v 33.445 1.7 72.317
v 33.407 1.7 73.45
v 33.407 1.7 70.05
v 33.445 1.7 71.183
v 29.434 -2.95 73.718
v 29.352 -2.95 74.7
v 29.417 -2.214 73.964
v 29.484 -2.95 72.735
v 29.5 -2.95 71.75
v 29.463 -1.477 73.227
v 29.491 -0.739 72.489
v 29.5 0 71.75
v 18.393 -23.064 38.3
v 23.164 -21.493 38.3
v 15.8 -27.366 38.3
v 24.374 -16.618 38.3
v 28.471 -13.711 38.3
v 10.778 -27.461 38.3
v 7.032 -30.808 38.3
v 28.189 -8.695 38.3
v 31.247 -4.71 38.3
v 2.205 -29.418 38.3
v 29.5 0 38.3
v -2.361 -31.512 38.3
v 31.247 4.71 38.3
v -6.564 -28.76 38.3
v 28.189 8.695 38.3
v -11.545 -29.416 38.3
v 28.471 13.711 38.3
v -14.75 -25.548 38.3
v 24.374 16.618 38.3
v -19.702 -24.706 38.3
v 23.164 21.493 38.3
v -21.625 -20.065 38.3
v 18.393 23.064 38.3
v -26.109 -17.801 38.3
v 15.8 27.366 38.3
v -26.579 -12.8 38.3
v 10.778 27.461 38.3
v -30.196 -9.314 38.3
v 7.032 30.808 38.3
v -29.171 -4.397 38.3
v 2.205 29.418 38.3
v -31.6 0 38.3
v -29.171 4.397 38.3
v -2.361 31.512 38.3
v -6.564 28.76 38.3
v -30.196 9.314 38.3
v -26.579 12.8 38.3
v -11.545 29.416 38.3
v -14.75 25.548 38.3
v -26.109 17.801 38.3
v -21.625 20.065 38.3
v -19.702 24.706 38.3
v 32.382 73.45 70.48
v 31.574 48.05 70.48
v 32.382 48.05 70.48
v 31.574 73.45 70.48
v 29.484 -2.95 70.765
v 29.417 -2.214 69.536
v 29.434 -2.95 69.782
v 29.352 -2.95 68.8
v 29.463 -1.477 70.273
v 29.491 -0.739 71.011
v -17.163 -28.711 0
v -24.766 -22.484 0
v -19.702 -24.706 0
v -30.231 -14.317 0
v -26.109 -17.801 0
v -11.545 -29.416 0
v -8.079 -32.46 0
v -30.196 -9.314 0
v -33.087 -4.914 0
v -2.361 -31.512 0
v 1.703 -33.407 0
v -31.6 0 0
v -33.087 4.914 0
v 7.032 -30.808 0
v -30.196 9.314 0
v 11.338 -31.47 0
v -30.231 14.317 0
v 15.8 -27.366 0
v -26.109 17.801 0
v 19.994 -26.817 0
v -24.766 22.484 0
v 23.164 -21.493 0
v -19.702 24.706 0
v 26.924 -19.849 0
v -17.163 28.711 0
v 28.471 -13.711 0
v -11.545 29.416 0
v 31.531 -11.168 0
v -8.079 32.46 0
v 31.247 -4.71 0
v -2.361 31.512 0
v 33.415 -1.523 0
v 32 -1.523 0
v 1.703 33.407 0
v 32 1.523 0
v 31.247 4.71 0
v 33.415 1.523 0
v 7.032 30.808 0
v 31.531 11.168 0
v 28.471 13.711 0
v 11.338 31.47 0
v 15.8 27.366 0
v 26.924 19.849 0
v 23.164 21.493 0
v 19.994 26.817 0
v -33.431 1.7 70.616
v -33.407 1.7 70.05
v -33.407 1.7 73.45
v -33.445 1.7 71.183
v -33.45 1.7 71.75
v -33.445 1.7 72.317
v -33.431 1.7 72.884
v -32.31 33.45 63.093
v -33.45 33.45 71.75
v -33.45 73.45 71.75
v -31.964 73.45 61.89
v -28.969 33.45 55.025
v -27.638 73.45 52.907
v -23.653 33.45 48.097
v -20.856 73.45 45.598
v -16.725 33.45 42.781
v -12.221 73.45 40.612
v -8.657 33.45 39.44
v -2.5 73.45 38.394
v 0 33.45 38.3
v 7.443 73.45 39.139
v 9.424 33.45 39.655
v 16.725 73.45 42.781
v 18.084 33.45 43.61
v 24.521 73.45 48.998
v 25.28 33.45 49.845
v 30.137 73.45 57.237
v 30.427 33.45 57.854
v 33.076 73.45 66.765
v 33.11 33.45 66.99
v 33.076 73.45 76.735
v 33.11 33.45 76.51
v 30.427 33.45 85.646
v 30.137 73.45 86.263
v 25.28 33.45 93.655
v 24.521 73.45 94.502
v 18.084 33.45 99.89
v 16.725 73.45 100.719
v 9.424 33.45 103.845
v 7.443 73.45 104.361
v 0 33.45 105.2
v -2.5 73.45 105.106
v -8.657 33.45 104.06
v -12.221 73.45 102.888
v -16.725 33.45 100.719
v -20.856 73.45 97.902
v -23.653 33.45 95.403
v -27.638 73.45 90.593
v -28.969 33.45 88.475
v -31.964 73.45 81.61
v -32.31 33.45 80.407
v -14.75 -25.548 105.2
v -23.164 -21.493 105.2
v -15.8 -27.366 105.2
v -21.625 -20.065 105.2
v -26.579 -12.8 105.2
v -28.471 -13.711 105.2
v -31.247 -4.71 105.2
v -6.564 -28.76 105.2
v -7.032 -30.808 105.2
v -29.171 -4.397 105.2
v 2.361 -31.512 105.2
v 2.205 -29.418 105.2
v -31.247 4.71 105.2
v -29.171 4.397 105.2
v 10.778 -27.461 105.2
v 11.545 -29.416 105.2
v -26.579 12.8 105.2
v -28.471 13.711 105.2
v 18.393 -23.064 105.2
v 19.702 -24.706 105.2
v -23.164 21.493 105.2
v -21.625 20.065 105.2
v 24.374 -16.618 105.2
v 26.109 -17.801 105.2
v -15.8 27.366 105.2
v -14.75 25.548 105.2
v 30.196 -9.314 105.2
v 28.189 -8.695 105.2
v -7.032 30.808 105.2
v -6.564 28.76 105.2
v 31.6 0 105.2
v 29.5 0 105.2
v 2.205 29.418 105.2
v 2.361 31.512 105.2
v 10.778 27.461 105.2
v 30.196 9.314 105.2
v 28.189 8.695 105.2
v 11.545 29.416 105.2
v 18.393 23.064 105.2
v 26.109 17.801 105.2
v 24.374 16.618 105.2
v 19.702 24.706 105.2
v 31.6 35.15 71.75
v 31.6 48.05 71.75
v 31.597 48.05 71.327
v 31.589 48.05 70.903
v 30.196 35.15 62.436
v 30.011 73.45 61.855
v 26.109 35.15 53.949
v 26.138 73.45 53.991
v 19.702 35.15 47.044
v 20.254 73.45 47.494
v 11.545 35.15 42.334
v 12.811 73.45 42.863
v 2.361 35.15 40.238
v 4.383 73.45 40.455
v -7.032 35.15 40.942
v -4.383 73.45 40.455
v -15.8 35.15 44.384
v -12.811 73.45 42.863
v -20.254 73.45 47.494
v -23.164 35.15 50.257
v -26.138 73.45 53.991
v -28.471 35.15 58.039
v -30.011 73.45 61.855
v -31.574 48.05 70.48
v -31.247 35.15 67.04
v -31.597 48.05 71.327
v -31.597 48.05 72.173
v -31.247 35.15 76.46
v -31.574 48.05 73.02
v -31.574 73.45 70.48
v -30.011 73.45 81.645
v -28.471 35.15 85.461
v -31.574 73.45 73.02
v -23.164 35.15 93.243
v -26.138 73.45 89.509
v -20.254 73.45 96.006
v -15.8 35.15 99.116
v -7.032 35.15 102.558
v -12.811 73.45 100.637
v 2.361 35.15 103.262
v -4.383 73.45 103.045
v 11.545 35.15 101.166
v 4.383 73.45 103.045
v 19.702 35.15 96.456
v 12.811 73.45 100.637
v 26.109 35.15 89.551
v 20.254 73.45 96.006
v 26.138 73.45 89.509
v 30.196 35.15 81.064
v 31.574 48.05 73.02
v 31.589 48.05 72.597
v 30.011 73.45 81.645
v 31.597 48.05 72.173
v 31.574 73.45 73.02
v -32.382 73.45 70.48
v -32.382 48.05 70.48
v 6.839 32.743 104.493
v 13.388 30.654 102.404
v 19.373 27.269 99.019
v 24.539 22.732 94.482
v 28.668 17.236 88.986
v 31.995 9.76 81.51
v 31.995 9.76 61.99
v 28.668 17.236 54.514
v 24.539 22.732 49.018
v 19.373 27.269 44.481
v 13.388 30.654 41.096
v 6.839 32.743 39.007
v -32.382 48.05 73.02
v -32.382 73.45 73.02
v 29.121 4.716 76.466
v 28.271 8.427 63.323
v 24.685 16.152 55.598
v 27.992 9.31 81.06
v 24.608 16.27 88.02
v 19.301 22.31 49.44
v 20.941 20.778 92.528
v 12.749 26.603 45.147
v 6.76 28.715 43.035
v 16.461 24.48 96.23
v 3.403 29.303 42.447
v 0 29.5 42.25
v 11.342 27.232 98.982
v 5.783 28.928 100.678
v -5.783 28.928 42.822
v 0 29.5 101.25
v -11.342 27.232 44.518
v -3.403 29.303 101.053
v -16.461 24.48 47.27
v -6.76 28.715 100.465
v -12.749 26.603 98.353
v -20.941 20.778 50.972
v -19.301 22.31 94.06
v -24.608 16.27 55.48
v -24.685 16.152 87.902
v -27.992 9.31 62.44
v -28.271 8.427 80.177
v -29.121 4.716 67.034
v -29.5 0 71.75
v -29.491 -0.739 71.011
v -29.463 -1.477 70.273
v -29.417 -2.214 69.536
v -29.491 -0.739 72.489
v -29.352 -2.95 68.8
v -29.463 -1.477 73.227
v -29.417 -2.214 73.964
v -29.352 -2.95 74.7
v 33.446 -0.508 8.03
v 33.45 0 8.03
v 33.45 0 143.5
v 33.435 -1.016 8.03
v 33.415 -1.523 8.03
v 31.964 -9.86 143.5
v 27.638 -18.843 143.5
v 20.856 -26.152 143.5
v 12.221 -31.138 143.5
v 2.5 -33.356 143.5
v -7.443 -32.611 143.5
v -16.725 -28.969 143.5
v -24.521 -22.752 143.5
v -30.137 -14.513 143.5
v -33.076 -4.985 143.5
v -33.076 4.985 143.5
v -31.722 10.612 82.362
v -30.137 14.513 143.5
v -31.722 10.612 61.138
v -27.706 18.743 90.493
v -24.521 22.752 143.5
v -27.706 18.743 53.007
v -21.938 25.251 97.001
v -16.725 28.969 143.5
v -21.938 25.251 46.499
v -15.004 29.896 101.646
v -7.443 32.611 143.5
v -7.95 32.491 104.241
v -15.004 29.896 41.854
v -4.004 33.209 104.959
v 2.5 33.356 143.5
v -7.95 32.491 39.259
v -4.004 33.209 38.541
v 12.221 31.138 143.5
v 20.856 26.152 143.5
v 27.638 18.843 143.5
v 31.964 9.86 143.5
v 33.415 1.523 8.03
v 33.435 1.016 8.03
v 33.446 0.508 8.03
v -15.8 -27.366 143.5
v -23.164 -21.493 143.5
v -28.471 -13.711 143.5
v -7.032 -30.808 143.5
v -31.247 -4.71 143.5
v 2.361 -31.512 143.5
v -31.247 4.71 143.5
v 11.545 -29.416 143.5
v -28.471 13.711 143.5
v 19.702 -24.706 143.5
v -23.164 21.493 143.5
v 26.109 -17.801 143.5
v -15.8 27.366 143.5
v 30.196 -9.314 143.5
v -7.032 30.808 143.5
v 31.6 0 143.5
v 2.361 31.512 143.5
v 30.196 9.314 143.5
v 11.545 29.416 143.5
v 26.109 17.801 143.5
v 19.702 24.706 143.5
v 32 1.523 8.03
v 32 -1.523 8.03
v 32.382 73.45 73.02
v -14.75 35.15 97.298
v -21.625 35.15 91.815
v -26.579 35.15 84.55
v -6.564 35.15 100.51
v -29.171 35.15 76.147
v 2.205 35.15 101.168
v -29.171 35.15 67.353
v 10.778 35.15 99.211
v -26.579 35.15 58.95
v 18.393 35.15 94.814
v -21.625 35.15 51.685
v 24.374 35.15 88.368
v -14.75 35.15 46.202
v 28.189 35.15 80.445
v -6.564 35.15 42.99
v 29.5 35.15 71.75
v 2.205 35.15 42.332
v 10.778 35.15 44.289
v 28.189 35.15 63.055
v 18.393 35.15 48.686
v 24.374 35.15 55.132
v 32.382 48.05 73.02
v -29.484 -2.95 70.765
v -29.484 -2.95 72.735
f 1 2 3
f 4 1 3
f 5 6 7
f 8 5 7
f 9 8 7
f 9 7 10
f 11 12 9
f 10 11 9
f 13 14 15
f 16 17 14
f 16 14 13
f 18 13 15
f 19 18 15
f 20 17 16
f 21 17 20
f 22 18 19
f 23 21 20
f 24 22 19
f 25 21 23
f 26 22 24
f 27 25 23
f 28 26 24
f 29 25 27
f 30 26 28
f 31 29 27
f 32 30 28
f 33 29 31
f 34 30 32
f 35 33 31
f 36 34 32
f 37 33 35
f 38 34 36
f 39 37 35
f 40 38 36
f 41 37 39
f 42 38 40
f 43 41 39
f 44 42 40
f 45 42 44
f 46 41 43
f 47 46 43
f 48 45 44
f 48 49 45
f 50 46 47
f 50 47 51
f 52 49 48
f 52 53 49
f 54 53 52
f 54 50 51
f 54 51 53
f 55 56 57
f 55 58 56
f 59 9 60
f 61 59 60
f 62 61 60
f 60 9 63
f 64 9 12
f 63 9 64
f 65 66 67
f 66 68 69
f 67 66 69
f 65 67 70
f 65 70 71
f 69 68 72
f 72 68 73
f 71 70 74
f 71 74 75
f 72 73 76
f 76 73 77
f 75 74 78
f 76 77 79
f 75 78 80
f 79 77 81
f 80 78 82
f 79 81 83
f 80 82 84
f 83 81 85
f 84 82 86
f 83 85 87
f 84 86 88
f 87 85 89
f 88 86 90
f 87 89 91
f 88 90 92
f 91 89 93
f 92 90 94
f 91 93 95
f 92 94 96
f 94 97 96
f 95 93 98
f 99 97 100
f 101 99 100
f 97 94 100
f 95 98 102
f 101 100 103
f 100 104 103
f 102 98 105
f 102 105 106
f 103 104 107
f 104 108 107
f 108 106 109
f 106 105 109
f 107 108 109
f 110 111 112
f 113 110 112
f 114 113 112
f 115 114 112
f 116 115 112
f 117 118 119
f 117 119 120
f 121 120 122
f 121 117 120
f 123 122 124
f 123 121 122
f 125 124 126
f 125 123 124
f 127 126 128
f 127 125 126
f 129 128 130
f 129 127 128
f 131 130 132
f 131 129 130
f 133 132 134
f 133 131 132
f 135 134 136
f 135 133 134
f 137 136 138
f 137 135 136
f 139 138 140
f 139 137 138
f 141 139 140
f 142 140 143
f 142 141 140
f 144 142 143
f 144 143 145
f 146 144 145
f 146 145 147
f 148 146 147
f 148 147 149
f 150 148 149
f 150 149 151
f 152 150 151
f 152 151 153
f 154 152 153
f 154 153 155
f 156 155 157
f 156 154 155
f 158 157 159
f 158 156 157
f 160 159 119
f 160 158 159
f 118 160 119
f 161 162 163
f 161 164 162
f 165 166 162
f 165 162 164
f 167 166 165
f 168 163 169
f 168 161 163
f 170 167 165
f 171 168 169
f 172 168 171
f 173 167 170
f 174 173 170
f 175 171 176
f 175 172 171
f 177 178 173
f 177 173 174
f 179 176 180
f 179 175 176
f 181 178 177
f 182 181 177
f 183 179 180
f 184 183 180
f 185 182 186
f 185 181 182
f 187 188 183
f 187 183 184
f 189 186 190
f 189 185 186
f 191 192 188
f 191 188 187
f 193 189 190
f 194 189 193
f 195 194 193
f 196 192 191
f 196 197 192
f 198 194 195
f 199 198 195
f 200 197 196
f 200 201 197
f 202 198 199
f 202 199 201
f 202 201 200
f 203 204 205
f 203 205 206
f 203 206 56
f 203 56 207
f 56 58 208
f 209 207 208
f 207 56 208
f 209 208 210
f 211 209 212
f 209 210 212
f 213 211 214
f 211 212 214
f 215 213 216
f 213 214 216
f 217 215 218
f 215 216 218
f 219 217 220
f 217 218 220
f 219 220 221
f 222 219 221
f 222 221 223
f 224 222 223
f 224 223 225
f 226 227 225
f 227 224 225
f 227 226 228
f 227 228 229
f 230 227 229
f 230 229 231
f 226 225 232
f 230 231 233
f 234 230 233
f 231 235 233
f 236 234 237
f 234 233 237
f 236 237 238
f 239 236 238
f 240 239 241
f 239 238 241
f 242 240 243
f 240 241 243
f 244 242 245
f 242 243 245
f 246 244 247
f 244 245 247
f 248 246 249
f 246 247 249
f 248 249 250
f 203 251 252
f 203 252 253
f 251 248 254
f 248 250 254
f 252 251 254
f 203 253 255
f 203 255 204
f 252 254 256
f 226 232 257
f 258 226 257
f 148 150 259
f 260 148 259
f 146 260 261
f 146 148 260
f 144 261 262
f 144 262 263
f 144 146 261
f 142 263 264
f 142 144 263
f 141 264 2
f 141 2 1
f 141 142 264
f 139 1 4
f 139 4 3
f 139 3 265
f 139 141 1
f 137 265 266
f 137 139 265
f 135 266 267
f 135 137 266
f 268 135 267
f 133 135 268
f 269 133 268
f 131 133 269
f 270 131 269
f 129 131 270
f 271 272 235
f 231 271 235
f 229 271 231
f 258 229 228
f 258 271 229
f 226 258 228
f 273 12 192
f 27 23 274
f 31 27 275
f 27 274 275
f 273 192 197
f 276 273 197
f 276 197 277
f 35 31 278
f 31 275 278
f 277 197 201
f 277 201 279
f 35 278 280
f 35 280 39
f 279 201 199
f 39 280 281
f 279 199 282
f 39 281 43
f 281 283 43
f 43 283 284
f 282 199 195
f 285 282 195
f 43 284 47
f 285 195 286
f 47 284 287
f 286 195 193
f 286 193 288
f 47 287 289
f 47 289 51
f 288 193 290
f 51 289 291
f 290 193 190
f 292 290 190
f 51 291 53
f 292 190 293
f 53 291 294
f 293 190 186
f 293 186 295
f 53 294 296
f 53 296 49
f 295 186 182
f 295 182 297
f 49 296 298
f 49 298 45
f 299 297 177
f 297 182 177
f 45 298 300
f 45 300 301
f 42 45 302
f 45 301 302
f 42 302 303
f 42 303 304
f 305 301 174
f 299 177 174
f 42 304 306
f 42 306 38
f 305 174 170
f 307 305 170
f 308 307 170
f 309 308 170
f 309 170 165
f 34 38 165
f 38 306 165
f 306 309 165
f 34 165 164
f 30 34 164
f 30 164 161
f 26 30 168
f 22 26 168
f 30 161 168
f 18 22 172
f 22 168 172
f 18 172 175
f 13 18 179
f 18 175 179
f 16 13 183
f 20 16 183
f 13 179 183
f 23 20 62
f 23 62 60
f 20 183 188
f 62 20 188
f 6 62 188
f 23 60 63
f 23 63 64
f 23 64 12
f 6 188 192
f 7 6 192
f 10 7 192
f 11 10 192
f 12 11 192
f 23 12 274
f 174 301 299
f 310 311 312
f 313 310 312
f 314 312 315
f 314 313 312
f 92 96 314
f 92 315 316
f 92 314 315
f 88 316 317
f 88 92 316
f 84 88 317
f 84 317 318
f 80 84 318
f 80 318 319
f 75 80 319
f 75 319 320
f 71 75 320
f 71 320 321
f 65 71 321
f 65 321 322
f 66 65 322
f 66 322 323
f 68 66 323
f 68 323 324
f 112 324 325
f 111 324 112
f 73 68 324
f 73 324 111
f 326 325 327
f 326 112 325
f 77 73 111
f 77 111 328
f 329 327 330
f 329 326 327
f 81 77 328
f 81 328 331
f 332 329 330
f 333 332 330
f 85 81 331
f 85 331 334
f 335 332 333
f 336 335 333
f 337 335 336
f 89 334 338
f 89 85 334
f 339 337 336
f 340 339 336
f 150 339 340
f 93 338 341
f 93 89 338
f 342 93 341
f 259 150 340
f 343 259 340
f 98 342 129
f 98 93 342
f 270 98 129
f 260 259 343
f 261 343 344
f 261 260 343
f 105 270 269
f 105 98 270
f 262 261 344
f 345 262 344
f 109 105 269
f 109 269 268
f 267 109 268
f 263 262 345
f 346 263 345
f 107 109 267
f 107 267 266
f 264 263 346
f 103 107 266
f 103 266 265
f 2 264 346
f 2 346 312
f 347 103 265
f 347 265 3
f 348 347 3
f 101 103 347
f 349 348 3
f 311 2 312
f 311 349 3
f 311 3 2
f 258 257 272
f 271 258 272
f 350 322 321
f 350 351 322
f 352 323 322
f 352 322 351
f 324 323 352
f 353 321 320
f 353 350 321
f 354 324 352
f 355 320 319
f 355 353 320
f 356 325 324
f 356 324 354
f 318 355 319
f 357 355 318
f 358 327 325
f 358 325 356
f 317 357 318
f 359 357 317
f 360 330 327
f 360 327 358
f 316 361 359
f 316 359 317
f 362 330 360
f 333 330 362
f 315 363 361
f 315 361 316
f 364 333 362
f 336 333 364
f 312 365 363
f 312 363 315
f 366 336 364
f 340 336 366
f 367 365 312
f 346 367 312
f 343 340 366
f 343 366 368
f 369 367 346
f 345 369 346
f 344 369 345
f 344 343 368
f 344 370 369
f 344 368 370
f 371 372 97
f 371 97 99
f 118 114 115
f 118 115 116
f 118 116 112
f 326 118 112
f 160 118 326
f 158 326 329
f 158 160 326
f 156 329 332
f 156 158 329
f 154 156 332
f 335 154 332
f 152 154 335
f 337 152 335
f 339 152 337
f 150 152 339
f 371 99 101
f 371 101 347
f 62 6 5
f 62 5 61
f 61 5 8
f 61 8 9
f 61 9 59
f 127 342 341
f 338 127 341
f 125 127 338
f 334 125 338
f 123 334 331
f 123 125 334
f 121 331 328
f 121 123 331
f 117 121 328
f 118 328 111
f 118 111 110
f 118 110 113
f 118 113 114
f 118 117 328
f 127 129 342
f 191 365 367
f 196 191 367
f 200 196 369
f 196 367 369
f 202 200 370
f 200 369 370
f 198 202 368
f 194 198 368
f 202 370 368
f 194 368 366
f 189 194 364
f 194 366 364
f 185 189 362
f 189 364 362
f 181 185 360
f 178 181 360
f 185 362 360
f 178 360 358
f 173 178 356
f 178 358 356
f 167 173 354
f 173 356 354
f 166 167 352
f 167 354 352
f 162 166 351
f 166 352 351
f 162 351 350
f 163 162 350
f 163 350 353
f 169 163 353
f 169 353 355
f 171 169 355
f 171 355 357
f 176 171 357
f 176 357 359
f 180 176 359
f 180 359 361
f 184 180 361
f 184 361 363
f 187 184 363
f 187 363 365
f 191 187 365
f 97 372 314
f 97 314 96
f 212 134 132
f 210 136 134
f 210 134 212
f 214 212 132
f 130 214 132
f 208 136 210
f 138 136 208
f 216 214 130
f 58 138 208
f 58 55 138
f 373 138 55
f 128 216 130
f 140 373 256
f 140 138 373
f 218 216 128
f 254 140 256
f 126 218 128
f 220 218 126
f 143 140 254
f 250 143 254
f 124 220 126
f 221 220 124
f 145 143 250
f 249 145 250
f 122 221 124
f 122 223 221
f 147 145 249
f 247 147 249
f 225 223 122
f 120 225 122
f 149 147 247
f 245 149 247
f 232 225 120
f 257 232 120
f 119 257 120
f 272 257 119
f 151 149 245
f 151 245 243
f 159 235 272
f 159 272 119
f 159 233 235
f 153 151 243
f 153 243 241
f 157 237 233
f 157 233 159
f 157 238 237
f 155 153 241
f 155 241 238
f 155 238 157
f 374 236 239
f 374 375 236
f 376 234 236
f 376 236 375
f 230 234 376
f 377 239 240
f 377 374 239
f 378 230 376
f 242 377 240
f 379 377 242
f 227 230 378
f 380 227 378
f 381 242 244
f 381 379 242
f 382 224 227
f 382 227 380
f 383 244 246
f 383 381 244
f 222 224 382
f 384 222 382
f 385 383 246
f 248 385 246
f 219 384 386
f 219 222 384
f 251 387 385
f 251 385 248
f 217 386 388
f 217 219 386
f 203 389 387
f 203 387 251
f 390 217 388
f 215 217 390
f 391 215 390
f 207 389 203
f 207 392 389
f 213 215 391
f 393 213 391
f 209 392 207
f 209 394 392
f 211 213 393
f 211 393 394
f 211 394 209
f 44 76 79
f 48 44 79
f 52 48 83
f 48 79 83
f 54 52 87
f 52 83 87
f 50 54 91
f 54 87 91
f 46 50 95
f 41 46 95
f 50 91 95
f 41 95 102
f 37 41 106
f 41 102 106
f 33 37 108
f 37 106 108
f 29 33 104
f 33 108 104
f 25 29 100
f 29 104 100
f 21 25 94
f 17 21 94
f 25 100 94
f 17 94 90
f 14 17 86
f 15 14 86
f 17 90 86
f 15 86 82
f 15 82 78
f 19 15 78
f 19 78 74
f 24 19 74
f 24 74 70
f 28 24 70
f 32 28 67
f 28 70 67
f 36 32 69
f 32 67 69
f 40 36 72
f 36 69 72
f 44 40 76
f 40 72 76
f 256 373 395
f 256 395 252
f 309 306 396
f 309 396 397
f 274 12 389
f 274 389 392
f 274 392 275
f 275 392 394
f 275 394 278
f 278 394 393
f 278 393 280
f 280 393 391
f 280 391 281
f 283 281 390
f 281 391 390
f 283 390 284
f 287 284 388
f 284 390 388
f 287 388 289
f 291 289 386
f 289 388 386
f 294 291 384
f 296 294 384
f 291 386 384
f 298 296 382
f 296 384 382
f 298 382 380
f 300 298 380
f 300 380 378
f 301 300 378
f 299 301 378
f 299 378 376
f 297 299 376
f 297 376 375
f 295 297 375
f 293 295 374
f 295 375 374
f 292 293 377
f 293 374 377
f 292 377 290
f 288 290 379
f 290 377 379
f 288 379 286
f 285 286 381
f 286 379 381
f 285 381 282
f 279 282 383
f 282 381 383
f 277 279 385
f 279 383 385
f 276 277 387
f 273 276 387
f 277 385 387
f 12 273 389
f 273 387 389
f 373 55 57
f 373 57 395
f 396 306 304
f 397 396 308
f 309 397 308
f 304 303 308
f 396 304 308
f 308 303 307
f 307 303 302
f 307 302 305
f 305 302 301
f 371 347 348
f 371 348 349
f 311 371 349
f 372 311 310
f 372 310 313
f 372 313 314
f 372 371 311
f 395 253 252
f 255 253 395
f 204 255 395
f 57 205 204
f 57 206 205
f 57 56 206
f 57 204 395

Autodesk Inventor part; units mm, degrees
ref_plane "XZ Plane" through (0, 0, 0) normal (0, 1, 0) x (-1, 0, 0)
sketch "Sketch1" plane through (0, 0, 0) normal (0, 0, 1) x (1, 0, 0)
  circle A0 centre (0, 0) radius 33.45
  dimension "d0" = 66.9
extrude "mainBody" add sketch "Sketch1" along normal blind 143.5
sketch "Sketch10" plane through (0, 0, 143.5) normal (0, 0, 1) x (1, 0, 0)
  circle A0 centre (0, 0) radius 30.1625 projected
  circle A1 centre (0, 0) radius 33.45 projected
  point P0 (0, 33.45)
ref_plane "Work Plane5" through (0, 33.45, 143.5) normal (0, 1, 0) x (-1, 0, 0)
sketch "Sketch11" plane through (0, 33.45, 143.5) normal (0, 1, 0) x (-1, 0, 0)
  circle A0 centre (0, -71.75) radius 33.45
  line L0 (33.45, 0) -> (-33.45, 0) projected
  point P0 (0, -143.5)
  dimension "d29" = 71.75
  dimension "d30" = 66.9
extrude "TBody" add sketch "Sketch11" along normal blind 40 and the other way blind 31.75
sketch "Sketch12" plane through (0, 73.45, 71.75) normal (0, 1, 0) x (1, 0, 0)
  circle A0 centre (0, 0) radius 33.45 projected
  circle A1 centre (0, 0) radius 31.6
  point P0 (0, 71.75)
  dimension "d35" = 63.2
extrude "TSocket" cut sketch "Sketch12" against normal blind 38.3 contours A1
sketch "Sketch13" plane through (0, 35.15, 71.75) normal (0, 1, 0) x (1, 0, 0)
  circle A0 centre (0, 0) radius 31.6 projected
  circle A1 centre (0, 0) radius 29.5
  point P0 (0, 71.75)
  dimension "d39" = 59
extrude "TTube" cut sketch "Sketch13" against normal blind 38.1 contours A1
sketch "Sketch14" plane through (0, 0, 143.5) normal (0, 0, 1) x (1, 0, 0)
  circle A0 centre (0, 0) radius 33.45 projected
  circle A1 centre (0, 0) radius 29.5
  dimension "d43" = 59
extrude "mainTube" cut sketch "Sketch14" against normal blind 177.8 contours A1
sketch "Sketch15" plane through (0, 0, 143.5) normal (0, 0, 1) x (1, 0, 0)
  circle A0 centre (0, 0) radius 29.5 projected
  circle A1 centre (0, 0) radius 33.45 projected
  circle A2 centre (0, 0) radius 31.6
  dimension "d47" = 63.2
extrude "mainSocket1" cut sketch "Sketch15" against normal blind 38.3 contours A2
sketch "Sketch16" plane through (0, 0, 0) normal (0, 0, -1) x (-1, 0, 0)
  circle A0 centre (0, 0) radius 29.5 projected
  circle A1 centre (0, 0) radius 33.45 projected
  circle A2 centre (0, 0) radius 31.6
  dimension "d51" = 63.2
extrude "mainSocket2" cut sketch "Sketch16" against normal blind 38.3 contours A2
sketch "Sketch24" plane through (0, 73.45, 71.75) normal (0, 1, 0) x (1, 0, 0)
  circle A0 centre (0, 0) radius 31.6 projected
  line L0 (-31.6, 0) -> (31.6, 0) construction
  line L1 (0, 31.6) -> (0, -31.6) construction
  line L2 (-32.3825, -1.27) -> (-28.3825, -1.27)
  line L3 (-28.3825, -1.27) -> (-28.3825, 1.27)
  line L4 (-28.3825, 1.27) -> (-32.3825, 1.27)
  line L5 (-32.3825, 1.27) -> (-32.3825, -1.27)
  line L6 (-32.3825, 0) -> (-28.3825, 0) construction
  line L7 (32.3825, -1.27) -> (28.3825, -1.27)
  line L8 (28.3825, -1.27) -> (28.3825, 1.27)
  line L9 (28.3825, 1.27) -> (32.3825, 1.27)
  line L10 (32.3825, 1.27) -> (32.3825, -1.27)
  line L11 (32.3825, 0) -> (28.3825, 0) construction
  point P0 (0, 71.75)
  dimension "d72" = 4
  dimension "d75" = 2.54
extrude "Extrusion20" cut sketch "Sketch24" against normal blind 25.4 contours A0 L7 L8 L9 | A0 L9 L10 L7 | L4 L3 L2 A0 | A0 L2 L5 L4
ref_plane "Work Plane6" through (32, 0, 0) normal (1, 0, 0) x (0, 1, 0)
sketch "Sketch27" plane through (32, 0, 0) normal (1, 0, 0) x (0, 1, 0)
  line L0 (-1.5232, -1.2223) -> (1.5232, -1.2223)
  line L1 (1.5232, -1.2223) -> (1.5232, 8.0295)
  line L2 (1.5232, 8.0295) -> (-1.5232, 8.0295)
  line L3 (-1.5232, 8.0295) -> (-1.5232, -1.2223)
  point P0 (0, 0)
extrude "Extrusion22" cut sketch "Sketch27" along normal blind 25.4
equation "\"d1\" = length"
equation "\"d29\" = 0.5 * length"
equation "\"length\" = 143.5"
properties part number "0pvc_T_2in" material "PVC-Piping"
